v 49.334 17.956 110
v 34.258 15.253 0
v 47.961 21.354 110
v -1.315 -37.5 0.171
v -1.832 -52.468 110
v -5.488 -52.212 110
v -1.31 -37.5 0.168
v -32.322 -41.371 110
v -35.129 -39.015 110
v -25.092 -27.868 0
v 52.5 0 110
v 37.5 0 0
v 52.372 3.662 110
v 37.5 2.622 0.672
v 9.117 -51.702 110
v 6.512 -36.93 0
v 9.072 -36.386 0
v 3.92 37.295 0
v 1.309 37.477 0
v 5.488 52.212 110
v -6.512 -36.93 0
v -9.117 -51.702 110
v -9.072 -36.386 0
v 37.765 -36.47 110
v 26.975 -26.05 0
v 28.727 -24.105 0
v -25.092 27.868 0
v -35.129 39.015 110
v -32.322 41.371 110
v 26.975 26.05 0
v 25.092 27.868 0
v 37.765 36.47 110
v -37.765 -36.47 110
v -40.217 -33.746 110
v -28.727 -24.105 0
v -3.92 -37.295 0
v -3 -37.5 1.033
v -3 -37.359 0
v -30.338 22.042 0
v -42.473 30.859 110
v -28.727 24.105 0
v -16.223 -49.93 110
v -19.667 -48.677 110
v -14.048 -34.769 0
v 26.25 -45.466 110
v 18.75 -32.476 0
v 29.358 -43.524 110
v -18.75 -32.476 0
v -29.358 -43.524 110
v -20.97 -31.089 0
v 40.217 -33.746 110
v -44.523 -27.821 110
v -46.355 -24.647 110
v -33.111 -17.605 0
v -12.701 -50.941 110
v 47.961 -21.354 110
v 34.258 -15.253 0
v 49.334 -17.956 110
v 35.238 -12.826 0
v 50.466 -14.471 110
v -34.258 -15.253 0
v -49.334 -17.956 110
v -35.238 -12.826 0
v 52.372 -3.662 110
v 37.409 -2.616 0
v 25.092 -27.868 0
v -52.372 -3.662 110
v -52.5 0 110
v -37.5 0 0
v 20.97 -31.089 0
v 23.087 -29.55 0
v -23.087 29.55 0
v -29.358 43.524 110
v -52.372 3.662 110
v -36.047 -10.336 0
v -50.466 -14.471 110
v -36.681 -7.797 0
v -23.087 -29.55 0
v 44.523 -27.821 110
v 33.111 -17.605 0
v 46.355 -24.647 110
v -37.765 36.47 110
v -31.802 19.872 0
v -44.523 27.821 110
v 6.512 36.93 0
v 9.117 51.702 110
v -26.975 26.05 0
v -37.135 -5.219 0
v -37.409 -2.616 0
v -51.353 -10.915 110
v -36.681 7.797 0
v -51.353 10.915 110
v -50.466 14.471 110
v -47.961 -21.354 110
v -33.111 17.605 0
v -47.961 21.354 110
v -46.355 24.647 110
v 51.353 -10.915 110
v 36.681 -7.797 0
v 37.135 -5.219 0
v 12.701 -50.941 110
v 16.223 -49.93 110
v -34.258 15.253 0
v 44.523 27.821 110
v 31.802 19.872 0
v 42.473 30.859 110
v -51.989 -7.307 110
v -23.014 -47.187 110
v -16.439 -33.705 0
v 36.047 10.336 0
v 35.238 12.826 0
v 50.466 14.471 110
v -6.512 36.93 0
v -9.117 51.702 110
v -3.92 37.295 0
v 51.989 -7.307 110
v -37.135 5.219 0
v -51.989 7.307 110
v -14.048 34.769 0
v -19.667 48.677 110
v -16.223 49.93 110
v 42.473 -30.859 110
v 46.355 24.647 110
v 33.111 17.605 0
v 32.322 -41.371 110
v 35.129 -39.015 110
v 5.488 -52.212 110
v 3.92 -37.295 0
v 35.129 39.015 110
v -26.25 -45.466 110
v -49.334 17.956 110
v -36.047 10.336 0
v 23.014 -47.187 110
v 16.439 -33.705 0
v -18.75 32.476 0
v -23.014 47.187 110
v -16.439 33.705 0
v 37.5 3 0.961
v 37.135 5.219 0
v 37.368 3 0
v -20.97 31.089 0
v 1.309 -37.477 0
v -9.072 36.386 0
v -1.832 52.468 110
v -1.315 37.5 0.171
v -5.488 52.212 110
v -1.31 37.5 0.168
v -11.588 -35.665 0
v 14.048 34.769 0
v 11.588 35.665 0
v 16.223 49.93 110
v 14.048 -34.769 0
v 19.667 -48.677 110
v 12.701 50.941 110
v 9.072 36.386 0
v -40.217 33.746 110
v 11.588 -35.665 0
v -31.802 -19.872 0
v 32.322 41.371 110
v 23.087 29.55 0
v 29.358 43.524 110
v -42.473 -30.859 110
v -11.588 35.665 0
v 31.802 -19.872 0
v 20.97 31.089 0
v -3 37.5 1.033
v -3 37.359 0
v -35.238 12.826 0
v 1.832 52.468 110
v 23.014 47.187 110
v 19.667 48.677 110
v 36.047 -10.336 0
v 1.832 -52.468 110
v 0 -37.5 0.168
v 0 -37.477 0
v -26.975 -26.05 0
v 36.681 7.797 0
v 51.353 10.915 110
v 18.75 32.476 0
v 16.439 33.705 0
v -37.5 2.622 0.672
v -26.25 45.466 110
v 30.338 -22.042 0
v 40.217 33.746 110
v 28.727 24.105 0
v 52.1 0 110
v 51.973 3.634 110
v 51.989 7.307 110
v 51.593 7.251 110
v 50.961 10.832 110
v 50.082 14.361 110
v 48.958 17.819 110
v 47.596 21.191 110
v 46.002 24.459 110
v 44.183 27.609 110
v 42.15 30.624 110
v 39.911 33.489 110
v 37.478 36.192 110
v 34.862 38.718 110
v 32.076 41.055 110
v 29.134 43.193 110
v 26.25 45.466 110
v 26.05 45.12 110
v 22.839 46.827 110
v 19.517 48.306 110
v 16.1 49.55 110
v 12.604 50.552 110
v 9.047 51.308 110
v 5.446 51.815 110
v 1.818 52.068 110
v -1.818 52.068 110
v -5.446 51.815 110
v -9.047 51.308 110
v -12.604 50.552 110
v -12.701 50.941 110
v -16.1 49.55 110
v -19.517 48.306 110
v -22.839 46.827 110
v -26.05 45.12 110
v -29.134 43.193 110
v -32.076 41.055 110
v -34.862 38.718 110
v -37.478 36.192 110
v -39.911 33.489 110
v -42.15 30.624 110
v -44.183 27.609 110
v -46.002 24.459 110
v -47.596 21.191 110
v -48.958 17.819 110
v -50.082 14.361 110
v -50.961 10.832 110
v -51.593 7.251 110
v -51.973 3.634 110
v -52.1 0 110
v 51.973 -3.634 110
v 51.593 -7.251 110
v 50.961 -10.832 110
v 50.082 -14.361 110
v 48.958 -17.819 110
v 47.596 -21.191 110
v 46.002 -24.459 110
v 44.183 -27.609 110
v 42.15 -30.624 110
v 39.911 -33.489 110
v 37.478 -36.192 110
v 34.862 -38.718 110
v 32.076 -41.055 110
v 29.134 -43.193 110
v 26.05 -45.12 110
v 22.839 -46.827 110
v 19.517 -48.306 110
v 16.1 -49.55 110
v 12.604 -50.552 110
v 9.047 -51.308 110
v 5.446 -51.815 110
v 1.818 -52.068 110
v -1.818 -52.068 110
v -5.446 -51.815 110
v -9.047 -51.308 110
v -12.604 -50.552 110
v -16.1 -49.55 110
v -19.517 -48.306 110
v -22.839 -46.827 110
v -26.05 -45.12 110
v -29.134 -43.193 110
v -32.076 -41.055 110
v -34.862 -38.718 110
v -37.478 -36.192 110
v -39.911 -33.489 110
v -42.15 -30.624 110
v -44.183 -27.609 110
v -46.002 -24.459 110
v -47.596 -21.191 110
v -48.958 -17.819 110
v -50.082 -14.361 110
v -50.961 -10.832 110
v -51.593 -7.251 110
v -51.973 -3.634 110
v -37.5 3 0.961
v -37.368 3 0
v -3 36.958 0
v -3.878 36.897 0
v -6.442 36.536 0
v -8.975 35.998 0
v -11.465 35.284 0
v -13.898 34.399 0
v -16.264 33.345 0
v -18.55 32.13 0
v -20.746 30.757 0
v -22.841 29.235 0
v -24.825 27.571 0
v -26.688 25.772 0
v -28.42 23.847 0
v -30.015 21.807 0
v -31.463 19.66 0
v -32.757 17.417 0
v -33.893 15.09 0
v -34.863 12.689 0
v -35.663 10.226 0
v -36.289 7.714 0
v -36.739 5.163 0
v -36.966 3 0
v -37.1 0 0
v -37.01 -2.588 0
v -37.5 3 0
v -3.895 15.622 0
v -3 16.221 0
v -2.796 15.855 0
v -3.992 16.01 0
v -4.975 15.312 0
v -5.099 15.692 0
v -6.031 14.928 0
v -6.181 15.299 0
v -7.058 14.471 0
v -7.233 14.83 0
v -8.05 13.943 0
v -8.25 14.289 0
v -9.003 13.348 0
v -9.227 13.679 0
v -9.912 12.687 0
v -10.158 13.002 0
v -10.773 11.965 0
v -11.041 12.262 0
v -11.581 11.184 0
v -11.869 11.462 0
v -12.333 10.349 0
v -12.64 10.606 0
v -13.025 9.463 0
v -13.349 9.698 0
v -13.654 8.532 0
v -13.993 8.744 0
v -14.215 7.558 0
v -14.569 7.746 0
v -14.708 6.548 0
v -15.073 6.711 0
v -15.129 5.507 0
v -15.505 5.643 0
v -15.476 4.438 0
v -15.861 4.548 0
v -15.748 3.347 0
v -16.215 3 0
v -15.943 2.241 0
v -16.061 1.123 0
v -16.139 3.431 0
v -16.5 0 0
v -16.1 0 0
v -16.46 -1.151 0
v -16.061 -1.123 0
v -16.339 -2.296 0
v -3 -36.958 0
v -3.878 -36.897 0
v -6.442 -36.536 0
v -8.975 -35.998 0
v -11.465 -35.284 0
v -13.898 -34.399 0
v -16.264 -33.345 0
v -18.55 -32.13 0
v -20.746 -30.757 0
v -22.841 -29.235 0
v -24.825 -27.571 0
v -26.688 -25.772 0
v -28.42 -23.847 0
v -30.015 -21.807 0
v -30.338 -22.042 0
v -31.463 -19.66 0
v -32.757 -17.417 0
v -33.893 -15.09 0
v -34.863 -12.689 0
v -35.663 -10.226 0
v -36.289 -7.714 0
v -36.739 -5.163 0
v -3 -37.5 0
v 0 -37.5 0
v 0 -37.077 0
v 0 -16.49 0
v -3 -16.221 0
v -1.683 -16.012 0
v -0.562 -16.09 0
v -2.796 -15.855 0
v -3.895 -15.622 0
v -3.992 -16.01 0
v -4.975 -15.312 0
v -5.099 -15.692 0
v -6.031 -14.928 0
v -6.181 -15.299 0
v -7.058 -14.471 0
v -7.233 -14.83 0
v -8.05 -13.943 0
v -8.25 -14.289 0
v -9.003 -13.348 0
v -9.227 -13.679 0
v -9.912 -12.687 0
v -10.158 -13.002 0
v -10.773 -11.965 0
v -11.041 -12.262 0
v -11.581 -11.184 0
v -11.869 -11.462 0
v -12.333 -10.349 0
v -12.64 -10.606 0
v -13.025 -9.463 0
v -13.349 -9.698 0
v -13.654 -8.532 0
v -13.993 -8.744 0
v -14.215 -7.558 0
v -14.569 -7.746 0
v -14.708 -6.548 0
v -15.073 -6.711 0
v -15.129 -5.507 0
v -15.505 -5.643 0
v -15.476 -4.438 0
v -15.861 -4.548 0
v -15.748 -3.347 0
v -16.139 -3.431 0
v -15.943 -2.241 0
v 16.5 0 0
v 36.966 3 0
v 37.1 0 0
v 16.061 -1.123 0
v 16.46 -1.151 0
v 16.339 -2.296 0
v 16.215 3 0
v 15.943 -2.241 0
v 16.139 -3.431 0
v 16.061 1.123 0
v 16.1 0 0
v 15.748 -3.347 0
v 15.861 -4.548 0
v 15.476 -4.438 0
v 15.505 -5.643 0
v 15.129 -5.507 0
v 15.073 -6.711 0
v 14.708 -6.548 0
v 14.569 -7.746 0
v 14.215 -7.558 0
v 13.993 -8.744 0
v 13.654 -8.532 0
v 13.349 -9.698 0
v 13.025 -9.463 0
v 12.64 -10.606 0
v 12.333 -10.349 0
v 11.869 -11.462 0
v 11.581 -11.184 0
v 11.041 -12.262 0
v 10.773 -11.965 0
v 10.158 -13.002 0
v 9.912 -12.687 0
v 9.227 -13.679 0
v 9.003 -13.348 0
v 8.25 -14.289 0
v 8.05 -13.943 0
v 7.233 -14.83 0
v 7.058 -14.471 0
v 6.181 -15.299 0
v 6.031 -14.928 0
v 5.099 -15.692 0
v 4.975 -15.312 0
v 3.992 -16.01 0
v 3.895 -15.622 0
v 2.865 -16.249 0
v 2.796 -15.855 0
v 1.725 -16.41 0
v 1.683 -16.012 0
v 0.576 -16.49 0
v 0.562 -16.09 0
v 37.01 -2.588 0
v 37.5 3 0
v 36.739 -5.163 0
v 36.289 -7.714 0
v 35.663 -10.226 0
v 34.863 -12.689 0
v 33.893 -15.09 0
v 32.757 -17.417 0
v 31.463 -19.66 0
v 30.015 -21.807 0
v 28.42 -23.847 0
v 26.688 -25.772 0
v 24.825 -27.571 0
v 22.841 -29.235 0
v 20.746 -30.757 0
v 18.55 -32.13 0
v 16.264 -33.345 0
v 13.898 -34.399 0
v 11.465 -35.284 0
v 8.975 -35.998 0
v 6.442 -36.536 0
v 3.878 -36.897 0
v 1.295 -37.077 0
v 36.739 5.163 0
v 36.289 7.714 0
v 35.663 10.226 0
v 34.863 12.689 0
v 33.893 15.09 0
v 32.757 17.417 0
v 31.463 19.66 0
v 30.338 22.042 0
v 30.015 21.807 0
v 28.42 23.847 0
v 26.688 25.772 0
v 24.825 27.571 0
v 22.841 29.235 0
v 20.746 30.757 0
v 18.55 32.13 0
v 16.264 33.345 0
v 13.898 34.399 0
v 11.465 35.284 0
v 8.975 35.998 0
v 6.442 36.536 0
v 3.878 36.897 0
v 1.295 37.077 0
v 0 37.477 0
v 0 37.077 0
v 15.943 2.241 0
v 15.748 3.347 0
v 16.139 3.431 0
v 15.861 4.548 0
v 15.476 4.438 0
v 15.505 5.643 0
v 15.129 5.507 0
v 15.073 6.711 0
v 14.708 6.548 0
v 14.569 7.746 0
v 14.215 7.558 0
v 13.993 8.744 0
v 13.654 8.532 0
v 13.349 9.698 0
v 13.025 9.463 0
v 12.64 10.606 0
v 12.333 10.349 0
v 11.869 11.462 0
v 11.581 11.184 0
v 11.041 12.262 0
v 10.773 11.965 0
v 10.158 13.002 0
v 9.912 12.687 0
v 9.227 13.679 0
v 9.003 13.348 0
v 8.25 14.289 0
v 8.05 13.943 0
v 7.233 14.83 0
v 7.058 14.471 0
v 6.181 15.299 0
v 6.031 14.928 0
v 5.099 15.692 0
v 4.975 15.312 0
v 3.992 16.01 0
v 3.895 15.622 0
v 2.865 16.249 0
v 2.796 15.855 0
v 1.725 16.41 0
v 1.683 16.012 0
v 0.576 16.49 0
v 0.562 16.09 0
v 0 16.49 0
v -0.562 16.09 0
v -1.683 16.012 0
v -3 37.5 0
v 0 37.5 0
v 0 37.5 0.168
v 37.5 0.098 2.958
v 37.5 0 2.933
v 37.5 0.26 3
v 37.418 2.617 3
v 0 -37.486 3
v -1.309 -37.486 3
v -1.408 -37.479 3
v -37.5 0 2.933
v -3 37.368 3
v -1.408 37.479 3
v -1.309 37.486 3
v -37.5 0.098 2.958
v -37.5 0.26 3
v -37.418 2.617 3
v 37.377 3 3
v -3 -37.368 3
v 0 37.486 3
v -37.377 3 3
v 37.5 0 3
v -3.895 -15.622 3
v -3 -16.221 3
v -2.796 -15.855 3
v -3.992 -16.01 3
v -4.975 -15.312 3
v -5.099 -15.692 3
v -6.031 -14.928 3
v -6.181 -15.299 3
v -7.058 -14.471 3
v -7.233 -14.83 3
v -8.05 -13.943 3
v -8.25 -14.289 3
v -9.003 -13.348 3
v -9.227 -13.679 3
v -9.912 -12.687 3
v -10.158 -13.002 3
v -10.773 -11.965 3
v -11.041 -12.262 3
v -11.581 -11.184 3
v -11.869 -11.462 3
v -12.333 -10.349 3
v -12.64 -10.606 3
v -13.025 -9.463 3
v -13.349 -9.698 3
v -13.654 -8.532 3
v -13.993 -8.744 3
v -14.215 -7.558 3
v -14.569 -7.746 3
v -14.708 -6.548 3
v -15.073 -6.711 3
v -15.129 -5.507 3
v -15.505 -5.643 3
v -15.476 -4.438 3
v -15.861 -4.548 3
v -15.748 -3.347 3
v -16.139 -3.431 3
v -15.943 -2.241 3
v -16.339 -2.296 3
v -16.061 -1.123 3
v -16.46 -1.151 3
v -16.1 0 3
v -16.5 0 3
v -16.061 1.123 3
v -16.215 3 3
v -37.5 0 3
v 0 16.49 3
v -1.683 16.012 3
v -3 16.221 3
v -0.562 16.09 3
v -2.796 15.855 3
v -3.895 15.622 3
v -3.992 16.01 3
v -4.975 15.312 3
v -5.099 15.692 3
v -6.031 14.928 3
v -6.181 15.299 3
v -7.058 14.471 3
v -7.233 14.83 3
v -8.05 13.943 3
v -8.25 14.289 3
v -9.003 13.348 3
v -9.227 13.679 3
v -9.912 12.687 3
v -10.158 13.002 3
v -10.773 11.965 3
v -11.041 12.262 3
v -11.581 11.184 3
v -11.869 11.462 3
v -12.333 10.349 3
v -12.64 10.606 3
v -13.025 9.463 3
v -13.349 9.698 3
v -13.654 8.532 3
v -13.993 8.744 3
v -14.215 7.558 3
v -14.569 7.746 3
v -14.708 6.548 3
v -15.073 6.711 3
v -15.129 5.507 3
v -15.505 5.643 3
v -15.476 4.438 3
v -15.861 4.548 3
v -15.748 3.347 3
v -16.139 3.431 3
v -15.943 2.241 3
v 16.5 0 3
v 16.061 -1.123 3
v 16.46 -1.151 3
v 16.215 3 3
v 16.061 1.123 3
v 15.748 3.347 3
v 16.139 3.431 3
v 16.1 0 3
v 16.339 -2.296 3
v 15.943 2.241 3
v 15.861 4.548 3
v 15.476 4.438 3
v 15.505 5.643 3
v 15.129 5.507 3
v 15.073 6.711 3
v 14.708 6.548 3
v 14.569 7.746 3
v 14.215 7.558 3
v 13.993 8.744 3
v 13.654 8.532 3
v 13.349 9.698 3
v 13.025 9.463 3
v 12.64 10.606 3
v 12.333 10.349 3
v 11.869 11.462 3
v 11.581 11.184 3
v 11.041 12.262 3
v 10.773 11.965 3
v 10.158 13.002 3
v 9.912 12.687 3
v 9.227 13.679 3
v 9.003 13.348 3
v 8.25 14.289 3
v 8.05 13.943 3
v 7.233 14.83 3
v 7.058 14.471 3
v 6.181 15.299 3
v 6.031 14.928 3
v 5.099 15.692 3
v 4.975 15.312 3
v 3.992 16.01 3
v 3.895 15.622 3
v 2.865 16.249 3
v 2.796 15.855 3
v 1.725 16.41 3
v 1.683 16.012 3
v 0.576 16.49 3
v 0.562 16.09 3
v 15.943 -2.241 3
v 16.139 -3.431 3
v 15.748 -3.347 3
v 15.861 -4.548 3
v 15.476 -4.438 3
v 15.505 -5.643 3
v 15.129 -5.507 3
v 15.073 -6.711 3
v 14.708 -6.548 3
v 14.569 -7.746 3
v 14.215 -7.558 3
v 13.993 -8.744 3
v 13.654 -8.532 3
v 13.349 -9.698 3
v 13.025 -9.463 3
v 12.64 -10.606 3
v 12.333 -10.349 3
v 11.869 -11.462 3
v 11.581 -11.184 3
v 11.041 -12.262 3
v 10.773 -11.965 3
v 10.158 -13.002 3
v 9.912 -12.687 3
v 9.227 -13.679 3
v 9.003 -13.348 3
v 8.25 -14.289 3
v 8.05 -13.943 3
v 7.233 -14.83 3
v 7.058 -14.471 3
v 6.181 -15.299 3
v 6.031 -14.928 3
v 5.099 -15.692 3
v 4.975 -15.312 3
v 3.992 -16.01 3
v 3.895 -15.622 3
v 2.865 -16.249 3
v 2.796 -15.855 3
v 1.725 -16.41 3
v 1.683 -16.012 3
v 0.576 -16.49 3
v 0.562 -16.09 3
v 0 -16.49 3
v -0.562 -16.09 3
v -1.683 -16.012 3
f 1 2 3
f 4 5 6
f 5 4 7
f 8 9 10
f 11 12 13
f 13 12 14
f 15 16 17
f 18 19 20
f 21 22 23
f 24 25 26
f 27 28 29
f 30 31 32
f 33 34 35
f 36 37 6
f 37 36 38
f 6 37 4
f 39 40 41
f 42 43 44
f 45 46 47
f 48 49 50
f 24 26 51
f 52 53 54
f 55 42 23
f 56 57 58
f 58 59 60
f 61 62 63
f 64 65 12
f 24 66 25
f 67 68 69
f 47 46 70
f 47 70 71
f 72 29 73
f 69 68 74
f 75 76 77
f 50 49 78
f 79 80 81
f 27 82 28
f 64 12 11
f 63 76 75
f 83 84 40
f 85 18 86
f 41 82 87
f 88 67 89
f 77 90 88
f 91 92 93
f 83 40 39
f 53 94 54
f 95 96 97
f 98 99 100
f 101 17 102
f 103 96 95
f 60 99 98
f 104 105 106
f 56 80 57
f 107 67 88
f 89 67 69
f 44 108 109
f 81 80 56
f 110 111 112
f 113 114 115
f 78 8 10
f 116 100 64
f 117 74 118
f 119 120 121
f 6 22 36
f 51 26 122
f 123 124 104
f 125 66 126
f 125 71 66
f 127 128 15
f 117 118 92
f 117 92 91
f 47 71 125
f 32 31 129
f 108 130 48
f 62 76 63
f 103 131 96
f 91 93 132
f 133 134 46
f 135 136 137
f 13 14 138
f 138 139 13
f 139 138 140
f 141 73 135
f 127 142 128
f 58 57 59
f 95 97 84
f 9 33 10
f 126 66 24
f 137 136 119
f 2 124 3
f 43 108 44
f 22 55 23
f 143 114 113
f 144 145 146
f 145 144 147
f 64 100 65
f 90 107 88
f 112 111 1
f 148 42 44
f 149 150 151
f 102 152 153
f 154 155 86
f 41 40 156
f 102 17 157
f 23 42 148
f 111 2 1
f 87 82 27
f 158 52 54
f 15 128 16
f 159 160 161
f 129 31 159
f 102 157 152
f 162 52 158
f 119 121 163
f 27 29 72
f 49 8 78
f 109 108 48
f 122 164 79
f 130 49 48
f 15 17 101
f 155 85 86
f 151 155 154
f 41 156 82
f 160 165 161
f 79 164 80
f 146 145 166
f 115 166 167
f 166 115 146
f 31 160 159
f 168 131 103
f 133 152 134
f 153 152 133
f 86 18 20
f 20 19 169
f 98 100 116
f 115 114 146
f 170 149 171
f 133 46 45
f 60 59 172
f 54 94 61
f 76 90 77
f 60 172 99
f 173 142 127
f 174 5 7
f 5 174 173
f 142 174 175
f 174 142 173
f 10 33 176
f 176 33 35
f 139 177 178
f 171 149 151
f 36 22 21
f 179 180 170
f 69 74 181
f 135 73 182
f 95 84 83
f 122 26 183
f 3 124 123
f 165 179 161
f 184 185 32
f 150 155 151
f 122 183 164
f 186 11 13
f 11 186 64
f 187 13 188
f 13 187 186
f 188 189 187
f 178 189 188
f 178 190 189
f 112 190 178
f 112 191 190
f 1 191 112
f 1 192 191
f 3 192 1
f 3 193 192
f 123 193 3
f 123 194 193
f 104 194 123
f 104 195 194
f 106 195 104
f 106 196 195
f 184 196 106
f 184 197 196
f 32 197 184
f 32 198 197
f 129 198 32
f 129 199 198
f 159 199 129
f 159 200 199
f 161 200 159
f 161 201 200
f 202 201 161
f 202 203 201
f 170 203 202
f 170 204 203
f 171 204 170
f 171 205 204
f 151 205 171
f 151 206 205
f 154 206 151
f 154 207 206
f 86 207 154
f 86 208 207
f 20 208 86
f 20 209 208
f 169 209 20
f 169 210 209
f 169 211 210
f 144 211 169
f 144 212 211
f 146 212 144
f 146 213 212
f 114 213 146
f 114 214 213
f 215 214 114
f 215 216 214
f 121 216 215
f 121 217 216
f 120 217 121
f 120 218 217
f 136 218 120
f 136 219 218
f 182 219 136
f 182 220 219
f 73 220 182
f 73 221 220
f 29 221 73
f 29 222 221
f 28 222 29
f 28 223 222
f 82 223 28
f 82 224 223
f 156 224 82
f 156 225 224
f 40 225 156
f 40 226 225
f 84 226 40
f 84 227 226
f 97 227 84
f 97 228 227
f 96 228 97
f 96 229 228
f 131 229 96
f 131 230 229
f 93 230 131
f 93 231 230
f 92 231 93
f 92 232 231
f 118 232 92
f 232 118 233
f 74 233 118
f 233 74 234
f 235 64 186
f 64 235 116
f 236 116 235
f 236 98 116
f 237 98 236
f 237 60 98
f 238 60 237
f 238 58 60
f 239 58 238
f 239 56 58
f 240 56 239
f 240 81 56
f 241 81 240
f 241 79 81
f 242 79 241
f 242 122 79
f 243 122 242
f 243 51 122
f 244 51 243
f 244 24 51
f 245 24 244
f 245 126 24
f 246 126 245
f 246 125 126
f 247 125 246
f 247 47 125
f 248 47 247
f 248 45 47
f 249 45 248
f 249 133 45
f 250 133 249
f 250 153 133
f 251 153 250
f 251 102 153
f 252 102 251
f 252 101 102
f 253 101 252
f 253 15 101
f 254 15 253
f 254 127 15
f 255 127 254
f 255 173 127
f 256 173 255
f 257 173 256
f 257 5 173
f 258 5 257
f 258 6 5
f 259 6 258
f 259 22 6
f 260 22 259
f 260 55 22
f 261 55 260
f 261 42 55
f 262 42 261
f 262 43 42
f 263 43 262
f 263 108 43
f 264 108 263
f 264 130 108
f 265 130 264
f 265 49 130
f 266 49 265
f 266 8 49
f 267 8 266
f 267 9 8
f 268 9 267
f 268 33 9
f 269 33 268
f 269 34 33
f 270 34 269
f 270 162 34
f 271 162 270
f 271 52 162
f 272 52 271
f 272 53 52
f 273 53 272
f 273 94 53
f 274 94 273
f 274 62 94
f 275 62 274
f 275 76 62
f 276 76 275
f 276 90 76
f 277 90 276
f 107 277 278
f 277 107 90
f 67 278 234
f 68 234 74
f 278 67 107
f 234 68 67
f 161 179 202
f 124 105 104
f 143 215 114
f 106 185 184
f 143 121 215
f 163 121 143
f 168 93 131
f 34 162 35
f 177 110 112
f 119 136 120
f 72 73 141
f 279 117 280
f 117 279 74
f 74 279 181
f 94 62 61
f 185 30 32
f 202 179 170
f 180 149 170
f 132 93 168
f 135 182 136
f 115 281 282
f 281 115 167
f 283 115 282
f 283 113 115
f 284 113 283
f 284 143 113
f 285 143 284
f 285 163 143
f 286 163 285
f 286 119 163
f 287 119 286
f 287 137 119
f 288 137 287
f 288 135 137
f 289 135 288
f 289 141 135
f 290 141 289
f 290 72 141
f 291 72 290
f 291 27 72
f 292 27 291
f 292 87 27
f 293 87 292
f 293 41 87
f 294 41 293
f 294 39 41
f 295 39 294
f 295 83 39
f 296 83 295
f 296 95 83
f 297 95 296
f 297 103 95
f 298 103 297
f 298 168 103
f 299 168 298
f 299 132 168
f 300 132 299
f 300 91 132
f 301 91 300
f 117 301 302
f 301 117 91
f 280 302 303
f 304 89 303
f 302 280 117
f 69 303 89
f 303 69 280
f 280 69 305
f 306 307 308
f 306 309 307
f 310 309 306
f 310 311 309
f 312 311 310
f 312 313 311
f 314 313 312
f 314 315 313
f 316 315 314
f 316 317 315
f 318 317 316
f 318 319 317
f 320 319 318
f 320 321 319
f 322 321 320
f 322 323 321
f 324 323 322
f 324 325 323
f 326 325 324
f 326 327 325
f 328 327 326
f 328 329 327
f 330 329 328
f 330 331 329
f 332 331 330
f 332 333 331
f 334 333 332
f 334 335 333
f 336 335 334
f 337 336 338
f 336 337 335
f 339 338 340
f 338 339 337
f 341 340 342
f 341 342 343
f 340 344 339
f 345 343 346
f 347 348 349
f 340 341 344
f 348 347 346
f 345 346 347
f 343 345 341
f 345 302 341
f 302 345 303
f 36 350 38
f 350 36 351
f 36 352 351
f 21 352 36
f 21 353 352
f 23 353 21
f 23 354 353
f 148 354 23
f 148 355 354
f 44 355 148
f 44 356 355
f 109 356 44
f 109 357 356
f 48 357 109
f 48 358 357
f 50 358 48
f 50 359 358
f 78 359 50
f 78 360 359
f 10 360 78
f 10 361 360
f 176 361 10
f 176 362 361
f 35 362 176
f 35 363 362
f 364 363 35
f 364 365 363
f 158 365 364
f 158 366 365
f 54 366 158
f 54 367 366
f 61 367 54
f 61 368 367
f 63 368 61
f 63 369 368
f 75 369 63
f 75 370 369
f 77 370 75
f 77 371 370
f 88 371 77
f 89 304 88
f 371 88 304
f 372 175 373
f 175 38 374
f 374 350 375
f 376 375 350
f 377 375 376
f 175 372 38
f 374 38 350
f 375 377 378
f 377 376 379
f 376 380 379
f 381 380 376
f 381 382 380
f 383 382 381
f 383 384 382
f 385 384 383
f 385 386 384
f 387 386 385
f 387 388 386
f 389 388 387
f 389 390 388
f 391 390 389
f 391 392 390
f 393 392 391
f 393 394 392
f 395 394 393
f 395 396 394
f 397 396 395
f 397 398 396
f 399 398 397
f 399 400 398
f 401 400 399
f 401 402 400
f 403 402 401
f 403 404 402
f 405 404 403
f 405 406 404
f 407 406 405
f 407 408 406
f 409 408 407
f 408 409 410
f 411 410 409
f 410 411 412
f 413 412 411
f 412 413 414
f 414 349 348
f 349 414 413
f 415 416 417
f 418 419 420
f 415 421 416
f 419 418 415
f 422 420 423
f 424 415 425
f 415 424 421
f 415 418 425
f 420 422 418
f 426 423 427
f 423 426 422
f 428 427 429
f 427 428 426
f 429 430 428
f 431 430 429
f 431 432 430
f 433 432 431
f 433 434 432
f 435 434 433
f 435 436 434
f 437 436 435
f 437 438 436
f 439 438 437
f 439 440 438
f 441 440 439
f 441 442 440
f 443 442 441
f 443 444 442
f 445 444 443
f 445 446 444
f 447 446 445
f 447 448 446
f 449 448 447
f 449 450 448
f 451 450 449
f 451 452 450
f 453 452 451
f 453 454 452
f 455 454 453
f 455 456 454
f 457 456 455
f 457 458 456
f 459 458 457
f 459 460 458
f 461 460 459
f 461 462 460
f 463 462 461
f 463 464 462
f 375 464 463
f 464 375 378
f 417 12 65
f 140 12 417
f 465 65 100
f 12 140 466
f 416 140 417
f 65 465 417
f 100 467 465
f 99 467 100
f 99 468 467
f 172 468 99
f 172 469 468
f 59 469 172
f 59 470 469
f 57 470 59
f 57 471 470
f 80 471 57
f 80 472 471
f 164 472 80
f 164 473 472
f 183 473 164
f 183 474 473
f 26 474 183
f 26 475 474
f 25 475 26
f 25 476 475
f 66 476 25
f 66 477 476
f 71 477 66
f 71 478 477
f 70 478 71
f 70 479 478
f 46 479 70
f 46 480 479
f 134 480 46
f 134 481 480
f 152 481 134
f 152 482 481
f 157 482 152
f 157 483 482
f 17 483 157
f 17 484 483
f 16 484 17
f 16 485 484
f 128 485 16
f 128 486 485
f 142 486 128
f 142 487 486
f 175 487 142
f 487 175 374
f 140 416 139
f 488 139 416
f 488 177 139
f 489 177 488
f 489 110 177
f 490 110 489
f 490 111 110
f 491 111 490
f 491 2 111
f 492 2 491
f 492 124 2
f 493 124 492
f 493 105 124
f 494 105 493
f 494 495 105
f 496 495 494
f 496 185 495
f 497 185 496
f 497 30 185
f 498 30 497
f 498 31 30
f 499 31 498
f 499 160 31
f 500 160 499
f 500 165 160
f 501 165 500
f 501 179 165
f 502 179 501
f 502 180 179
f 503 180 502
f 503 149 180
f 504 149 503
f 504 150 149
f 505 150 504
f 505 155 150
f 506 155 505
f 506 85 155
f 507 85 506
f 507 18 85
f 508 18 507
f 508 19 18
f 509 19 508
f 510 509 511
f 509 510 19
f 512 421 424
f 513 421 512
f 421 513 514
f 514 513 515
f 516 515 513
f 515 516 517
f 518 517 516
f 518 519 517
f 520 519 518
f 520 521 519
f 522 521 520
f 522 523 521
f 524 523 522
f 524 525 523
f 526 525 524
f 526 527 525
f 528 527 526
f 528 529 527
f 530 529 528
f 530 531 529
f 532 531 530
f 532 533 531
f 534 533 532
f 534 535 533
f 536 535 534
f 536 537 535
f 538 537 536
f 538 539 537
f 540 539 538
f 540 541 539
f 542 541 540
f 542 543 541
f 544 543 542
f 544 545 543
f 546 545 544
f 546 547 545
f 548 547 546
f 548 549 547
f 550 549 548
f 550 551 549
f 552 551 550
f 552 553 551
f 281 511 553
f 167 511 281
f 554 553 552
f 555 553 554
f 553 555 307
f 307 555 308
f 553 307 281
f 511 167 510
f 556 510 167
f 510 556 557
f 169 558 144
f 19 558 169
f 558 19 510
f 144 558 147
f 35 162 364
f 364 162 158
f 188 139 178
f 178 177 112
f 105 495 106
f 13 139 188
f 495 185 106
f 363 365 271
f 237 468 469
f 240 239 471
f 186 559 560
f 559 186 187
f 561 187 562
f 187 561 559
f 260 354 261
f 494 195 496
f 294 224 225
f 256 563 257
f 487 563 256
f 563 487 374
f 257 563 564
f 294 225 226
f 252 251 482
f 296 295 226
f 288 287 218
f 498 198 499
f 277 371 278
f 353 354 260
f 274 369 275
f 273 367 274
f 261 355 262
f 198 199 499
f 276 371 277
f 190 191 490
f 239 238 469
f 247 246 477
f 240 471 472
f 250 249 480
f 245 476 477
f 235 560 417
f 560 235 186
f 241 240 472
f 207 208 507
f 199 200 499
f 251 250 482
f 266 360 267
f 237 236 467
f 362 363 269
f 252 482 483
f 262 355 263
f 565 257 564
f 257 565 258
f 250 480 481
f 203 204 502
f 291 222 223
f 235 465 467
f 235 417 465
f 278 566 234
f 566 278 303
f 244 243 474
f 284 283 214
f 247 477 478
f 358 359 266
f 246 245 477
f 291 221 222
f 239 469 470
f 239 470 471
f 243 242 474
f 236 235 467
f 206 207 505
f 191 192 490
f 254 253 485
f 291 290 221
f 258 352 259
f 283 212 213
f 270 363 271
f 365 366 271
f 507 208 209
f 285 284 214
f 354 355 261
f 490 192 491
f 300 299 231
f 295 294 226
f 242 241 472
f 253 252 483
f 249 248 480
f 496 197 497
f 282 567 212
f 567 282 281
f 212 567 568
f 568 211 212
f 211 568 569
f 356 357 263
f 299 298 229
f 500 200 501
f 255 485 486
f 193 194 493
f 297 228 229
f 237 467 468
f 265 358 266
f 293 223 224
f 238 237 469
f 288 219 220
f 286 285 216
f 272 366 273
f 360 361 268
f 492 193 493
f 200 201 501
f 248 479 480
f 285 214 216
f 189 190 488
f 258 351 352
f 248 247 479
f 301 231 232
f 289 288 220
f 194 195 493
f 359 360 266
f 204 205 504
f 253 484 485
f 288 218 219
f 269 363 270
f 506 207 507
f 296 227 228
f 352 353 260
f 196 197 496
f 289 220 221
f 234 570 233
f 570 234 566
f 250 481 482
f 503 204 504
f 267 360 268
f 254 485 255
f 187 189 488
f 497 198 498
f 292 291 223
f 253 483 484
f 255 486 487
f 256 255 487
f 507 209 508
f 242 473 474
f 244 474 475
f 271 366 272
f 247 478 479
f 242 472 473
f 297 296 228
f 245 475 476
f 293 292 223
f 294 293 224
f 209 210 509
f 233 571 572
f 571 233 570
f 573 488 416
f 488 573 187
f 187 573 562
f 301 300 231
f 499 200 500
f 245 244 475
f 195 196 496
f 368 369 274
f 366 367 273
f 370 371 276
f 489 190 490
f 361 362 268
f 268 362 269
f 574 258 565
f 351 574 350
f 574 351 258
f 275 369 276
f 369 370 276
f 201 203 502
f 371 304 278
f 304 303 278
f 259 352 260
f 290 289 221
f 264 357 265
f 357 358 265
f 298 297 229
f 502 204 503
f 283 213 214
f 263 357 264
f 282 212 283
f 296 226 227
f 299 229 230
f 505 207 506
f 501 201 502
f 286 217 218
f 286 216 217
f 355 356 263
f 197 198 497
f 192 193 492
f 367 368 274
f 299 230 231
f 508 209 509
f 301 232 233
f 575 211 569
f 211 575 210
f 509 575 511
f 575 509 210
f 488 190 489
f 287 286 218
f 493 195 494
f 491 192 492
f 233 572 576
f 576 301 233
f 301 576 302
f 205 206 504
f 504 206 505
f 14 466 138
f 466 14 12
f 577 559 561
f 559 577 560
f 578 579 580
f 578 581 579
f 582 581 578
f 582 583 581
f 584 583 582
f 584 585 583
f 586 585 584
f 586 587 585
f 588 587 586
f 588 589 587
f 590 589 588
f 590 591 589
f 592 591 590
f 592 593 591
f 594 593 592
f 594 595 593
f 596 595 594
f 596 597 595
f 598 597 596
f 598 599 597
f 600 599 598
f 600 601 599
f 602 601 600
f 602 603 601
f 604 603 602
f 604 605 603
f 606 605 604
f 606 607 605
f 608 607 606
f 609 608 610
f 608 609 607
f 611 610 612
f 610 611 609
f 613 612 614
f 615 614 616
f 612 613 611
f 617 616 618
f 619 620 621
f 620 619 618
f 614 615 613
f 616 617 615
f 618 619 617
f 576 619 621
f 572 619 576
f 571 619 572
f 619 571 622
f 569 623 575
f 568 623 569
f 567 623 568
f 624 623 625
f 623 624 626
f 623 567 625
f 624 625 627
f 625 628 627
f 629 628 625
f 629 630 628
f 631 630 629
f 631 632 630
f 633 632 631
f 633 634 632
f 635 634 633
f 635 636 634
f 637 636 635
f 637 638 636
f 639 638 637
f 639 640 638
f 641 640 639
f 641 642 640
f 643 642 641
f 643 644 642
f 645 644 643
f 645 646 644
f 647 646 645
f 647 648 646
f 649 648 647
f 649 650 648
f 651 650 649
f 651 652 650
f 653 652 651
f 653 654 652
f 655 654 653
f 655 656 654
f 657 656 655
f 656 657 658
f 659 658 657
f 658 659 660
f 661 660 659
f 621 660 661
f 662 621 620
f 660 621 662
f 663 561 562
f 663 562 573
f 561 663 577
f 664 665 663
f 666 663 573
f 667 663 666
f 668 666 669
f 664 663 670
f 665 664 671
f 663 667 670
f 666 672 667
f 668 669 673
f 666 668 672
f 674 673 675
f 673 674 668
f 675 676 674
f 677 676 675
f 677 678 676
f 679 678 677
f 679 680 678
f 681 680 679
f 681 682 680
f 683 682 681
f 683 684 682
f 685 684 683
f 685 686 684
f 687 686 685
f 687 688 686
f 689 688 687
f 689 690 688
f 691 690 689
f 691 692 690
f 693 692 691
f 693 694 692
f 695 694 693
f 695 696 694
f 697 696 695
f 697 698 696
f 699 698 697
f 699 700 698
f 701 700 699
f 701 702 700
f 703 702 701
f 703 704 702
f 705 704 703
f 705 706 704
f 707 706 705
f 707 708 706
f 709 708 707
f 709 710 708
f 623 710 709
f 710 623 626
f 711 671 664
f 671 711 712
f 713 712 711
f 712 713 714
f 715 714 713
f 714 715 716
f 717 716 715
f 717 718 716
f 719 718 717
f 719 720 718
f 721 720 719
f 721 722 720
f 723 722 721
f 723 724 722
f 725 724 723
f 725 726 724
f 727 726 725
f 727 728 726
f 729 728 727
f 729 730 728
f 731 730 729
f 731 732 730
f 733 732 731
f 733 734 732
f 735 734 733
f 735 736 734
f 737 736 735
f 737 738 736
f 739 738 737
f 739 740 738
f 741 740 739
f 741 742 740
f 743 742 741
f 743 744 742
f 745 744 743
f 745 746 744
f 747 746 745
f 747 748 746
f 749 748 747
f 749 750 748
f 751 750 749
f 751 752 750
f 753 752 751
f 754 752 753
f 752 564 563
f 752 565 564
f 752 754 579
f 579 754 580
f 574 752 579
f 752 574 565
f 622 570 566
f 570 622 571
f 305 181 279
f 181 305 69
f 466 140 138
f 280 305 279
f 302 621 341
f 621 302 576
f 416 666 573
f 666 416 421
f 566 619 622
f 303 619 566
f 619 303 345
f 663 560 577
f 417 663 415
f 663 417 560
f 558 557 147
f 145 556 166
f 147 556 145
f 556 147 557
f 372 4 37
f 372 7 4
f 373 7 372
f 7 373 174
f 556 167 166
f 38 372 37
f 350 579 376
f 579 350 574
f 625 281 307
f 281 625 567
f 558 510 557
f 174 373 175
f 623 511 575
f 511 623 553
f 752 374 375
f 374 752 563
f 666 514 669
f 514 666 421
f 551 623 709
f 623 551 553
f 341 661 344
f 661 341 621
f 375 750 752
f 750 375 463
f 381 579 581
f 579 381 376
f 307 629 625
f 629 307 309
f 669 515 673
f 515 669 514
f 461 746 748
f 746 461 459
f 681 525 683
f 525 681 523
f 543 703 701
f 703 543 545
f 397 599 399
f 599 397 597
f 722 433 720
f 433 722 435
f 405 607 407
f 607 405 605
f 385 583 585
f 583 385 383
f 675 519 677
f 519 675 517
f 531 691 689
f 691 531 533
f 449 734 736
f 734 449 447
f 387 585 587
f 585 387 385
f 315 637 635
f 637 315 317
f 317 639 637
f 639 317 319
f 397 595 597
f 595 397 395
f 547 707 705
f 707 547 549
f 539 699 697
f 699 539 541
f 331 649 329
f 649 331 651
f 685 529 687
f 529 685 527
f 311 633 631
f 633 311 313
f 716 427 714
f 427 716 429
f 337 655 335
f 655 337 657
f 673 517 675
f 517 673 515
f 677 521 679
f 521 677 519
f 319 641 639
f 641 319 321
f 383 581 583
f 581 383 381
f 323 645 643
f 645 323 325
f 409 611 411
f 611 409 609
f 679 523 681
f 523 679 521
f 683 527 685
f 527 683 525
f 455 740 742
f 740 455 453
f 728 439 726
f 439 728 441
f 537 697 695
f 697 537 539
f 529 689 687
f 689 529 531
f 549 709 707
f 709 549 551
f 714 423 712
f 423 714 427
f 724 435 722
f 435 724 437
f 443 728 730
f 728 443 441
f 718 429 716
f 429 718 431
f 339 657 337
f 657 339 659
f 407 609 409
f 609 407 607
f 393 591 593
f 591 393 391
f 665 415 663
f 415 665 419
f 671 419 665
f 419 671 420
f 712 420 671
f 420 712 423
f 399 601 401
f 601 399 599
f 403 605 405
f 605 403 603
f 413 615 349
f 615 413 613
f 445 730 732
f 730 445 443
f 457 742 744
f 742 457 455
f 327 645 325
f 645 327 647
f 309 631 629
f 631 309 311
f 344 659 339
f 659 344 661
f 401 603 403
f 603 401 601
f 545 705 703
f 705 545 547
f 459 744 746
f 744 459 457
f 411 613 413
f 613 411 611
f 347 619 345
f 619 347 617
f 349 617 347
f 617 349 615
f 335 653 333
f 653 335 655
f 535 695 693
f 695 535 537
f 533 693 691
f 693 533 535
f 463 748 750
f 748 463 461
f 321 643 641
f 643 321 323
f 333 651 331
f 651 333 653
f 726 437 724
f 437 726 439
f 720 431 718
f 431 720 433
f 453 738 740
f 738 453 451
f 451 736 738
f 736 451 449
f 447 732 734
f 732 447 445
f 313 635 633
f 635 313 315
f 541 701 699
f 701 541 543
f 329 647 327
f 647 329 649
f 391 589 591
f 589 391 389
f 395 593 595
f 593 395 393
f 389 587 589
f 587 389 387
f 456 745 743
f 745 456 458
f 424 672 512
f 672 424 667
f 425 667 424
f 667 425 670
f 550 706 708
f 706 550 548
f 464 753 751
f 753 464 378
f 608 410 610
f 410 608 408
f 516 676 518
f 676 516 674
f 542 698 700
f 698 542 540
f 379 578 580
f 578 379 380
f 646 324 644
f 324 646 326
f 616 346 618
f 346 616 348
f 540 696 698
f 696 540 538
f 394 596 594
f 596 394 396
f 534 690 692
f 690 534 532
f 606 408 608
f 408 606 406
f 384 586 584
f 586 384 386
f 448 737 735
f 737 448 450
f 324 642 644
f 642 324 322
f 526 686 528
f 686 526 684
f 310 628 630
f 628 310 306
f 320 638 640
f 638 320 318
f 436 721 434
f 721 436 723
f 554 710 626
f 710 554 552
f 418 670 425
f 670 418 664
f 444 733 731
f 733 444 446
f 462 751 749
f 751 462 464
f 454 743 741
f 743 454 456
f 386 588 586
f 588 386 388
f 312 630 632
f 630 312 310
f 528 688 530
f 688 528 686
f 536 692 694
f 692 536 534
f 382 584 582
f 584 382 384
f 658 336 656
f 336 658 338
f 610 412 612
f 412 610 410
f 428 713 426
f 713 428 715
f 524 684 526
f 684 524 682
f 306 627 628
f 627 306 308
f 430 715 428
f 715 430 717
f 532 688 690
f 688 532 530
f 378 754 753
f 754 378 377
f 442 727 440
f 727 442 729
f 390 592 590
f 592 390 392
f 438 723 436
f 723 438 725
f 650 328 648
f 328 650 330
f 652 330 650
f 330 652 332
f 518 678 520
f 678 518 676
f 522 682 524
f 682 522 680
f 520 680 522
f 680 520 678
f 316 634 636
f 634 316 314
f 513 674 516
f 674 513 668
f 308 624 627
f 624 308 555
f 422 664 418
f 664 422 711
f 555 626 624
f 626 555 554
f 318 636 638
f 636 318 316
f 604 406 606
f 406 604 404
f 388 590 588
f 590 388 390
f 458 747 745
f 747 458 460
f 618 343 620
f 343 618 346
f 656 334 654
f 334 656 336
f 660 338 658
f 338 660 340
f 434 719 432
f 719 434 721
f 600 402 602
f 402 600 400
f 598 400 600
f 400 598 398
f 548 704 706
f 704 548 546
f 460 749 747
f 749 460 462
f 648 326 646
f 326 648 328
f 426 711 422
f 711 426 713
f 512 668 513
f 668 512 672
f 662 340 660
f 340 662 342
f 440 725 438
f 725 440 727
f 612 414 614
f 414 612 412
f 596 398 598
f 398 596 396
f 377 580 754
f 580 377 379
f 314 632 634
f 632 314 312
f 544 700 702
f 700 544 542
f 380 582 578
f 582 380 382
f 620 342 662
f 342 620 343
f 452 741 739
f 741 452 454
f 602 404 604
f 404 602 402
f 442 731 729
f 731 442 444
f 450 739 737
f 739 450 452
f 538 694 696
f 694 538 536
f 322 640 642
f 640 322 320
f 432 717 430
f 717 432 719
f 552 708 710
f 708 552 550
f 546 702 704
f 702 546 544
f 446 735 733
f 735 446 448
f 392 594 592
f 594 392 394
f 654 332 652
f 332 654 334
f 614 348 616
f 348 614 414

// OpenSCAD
//
//  LightBulb Shade
//
//  EvilTeach
//
//  1/30/2016
//
// fill 0%
// layer .2
// no shells
// feed 50
// travel 80
//
// 6.33 meters of filament
// about 2 hours to print

// Build with 90 line segments for the circle
$fn = 90;

// Diameter of the small end of the shade
shadeDiameter  =  75.0;
shadeRadius    = shadeDiameter / 2;

// The height of the shade
shadeHeight    = 110.0;

// My smallest extruder size
shadeThickness =  0.4;

// diameter of the part that grips the bulb
holderDiameter = 33;
holderRadius = holderDiameter / 2;

// Height of the support
holderHeight = 3;


main();



module main()
{
    shade();
    holder();
}



module shade()
{
    difference()
    {
        cylinder(r1 = shadeRadius,
                 r2 = shadeRadius + 15, 
                 shadeHeight);
        cylinder(r1 = shadeRadius - shadeThickness, 
                 r2 = shadeRadius - shadeThickness + 15,
                 shadeHeight);
    }
}



module holder()
{
    difference()
    {
        union()
        {
            translate([-shadeRadius, 0, 0])
                cube([shadeDiameter, holderHeight, holderHeight]);

            translate([0, -shadeRadius, 0])
                rotate([0, 0, 90])
                    cube([shadeDiameter, holderHeight, holderHeight]);
        }

        cylinder(r = holderRadius, holderHeight);
    }

    difference()
    {
        cylinder(r = holderRadius, holderHeight);
        cylinder(r = holderRadius - shadeThickness, holderHeight);
    }
}
